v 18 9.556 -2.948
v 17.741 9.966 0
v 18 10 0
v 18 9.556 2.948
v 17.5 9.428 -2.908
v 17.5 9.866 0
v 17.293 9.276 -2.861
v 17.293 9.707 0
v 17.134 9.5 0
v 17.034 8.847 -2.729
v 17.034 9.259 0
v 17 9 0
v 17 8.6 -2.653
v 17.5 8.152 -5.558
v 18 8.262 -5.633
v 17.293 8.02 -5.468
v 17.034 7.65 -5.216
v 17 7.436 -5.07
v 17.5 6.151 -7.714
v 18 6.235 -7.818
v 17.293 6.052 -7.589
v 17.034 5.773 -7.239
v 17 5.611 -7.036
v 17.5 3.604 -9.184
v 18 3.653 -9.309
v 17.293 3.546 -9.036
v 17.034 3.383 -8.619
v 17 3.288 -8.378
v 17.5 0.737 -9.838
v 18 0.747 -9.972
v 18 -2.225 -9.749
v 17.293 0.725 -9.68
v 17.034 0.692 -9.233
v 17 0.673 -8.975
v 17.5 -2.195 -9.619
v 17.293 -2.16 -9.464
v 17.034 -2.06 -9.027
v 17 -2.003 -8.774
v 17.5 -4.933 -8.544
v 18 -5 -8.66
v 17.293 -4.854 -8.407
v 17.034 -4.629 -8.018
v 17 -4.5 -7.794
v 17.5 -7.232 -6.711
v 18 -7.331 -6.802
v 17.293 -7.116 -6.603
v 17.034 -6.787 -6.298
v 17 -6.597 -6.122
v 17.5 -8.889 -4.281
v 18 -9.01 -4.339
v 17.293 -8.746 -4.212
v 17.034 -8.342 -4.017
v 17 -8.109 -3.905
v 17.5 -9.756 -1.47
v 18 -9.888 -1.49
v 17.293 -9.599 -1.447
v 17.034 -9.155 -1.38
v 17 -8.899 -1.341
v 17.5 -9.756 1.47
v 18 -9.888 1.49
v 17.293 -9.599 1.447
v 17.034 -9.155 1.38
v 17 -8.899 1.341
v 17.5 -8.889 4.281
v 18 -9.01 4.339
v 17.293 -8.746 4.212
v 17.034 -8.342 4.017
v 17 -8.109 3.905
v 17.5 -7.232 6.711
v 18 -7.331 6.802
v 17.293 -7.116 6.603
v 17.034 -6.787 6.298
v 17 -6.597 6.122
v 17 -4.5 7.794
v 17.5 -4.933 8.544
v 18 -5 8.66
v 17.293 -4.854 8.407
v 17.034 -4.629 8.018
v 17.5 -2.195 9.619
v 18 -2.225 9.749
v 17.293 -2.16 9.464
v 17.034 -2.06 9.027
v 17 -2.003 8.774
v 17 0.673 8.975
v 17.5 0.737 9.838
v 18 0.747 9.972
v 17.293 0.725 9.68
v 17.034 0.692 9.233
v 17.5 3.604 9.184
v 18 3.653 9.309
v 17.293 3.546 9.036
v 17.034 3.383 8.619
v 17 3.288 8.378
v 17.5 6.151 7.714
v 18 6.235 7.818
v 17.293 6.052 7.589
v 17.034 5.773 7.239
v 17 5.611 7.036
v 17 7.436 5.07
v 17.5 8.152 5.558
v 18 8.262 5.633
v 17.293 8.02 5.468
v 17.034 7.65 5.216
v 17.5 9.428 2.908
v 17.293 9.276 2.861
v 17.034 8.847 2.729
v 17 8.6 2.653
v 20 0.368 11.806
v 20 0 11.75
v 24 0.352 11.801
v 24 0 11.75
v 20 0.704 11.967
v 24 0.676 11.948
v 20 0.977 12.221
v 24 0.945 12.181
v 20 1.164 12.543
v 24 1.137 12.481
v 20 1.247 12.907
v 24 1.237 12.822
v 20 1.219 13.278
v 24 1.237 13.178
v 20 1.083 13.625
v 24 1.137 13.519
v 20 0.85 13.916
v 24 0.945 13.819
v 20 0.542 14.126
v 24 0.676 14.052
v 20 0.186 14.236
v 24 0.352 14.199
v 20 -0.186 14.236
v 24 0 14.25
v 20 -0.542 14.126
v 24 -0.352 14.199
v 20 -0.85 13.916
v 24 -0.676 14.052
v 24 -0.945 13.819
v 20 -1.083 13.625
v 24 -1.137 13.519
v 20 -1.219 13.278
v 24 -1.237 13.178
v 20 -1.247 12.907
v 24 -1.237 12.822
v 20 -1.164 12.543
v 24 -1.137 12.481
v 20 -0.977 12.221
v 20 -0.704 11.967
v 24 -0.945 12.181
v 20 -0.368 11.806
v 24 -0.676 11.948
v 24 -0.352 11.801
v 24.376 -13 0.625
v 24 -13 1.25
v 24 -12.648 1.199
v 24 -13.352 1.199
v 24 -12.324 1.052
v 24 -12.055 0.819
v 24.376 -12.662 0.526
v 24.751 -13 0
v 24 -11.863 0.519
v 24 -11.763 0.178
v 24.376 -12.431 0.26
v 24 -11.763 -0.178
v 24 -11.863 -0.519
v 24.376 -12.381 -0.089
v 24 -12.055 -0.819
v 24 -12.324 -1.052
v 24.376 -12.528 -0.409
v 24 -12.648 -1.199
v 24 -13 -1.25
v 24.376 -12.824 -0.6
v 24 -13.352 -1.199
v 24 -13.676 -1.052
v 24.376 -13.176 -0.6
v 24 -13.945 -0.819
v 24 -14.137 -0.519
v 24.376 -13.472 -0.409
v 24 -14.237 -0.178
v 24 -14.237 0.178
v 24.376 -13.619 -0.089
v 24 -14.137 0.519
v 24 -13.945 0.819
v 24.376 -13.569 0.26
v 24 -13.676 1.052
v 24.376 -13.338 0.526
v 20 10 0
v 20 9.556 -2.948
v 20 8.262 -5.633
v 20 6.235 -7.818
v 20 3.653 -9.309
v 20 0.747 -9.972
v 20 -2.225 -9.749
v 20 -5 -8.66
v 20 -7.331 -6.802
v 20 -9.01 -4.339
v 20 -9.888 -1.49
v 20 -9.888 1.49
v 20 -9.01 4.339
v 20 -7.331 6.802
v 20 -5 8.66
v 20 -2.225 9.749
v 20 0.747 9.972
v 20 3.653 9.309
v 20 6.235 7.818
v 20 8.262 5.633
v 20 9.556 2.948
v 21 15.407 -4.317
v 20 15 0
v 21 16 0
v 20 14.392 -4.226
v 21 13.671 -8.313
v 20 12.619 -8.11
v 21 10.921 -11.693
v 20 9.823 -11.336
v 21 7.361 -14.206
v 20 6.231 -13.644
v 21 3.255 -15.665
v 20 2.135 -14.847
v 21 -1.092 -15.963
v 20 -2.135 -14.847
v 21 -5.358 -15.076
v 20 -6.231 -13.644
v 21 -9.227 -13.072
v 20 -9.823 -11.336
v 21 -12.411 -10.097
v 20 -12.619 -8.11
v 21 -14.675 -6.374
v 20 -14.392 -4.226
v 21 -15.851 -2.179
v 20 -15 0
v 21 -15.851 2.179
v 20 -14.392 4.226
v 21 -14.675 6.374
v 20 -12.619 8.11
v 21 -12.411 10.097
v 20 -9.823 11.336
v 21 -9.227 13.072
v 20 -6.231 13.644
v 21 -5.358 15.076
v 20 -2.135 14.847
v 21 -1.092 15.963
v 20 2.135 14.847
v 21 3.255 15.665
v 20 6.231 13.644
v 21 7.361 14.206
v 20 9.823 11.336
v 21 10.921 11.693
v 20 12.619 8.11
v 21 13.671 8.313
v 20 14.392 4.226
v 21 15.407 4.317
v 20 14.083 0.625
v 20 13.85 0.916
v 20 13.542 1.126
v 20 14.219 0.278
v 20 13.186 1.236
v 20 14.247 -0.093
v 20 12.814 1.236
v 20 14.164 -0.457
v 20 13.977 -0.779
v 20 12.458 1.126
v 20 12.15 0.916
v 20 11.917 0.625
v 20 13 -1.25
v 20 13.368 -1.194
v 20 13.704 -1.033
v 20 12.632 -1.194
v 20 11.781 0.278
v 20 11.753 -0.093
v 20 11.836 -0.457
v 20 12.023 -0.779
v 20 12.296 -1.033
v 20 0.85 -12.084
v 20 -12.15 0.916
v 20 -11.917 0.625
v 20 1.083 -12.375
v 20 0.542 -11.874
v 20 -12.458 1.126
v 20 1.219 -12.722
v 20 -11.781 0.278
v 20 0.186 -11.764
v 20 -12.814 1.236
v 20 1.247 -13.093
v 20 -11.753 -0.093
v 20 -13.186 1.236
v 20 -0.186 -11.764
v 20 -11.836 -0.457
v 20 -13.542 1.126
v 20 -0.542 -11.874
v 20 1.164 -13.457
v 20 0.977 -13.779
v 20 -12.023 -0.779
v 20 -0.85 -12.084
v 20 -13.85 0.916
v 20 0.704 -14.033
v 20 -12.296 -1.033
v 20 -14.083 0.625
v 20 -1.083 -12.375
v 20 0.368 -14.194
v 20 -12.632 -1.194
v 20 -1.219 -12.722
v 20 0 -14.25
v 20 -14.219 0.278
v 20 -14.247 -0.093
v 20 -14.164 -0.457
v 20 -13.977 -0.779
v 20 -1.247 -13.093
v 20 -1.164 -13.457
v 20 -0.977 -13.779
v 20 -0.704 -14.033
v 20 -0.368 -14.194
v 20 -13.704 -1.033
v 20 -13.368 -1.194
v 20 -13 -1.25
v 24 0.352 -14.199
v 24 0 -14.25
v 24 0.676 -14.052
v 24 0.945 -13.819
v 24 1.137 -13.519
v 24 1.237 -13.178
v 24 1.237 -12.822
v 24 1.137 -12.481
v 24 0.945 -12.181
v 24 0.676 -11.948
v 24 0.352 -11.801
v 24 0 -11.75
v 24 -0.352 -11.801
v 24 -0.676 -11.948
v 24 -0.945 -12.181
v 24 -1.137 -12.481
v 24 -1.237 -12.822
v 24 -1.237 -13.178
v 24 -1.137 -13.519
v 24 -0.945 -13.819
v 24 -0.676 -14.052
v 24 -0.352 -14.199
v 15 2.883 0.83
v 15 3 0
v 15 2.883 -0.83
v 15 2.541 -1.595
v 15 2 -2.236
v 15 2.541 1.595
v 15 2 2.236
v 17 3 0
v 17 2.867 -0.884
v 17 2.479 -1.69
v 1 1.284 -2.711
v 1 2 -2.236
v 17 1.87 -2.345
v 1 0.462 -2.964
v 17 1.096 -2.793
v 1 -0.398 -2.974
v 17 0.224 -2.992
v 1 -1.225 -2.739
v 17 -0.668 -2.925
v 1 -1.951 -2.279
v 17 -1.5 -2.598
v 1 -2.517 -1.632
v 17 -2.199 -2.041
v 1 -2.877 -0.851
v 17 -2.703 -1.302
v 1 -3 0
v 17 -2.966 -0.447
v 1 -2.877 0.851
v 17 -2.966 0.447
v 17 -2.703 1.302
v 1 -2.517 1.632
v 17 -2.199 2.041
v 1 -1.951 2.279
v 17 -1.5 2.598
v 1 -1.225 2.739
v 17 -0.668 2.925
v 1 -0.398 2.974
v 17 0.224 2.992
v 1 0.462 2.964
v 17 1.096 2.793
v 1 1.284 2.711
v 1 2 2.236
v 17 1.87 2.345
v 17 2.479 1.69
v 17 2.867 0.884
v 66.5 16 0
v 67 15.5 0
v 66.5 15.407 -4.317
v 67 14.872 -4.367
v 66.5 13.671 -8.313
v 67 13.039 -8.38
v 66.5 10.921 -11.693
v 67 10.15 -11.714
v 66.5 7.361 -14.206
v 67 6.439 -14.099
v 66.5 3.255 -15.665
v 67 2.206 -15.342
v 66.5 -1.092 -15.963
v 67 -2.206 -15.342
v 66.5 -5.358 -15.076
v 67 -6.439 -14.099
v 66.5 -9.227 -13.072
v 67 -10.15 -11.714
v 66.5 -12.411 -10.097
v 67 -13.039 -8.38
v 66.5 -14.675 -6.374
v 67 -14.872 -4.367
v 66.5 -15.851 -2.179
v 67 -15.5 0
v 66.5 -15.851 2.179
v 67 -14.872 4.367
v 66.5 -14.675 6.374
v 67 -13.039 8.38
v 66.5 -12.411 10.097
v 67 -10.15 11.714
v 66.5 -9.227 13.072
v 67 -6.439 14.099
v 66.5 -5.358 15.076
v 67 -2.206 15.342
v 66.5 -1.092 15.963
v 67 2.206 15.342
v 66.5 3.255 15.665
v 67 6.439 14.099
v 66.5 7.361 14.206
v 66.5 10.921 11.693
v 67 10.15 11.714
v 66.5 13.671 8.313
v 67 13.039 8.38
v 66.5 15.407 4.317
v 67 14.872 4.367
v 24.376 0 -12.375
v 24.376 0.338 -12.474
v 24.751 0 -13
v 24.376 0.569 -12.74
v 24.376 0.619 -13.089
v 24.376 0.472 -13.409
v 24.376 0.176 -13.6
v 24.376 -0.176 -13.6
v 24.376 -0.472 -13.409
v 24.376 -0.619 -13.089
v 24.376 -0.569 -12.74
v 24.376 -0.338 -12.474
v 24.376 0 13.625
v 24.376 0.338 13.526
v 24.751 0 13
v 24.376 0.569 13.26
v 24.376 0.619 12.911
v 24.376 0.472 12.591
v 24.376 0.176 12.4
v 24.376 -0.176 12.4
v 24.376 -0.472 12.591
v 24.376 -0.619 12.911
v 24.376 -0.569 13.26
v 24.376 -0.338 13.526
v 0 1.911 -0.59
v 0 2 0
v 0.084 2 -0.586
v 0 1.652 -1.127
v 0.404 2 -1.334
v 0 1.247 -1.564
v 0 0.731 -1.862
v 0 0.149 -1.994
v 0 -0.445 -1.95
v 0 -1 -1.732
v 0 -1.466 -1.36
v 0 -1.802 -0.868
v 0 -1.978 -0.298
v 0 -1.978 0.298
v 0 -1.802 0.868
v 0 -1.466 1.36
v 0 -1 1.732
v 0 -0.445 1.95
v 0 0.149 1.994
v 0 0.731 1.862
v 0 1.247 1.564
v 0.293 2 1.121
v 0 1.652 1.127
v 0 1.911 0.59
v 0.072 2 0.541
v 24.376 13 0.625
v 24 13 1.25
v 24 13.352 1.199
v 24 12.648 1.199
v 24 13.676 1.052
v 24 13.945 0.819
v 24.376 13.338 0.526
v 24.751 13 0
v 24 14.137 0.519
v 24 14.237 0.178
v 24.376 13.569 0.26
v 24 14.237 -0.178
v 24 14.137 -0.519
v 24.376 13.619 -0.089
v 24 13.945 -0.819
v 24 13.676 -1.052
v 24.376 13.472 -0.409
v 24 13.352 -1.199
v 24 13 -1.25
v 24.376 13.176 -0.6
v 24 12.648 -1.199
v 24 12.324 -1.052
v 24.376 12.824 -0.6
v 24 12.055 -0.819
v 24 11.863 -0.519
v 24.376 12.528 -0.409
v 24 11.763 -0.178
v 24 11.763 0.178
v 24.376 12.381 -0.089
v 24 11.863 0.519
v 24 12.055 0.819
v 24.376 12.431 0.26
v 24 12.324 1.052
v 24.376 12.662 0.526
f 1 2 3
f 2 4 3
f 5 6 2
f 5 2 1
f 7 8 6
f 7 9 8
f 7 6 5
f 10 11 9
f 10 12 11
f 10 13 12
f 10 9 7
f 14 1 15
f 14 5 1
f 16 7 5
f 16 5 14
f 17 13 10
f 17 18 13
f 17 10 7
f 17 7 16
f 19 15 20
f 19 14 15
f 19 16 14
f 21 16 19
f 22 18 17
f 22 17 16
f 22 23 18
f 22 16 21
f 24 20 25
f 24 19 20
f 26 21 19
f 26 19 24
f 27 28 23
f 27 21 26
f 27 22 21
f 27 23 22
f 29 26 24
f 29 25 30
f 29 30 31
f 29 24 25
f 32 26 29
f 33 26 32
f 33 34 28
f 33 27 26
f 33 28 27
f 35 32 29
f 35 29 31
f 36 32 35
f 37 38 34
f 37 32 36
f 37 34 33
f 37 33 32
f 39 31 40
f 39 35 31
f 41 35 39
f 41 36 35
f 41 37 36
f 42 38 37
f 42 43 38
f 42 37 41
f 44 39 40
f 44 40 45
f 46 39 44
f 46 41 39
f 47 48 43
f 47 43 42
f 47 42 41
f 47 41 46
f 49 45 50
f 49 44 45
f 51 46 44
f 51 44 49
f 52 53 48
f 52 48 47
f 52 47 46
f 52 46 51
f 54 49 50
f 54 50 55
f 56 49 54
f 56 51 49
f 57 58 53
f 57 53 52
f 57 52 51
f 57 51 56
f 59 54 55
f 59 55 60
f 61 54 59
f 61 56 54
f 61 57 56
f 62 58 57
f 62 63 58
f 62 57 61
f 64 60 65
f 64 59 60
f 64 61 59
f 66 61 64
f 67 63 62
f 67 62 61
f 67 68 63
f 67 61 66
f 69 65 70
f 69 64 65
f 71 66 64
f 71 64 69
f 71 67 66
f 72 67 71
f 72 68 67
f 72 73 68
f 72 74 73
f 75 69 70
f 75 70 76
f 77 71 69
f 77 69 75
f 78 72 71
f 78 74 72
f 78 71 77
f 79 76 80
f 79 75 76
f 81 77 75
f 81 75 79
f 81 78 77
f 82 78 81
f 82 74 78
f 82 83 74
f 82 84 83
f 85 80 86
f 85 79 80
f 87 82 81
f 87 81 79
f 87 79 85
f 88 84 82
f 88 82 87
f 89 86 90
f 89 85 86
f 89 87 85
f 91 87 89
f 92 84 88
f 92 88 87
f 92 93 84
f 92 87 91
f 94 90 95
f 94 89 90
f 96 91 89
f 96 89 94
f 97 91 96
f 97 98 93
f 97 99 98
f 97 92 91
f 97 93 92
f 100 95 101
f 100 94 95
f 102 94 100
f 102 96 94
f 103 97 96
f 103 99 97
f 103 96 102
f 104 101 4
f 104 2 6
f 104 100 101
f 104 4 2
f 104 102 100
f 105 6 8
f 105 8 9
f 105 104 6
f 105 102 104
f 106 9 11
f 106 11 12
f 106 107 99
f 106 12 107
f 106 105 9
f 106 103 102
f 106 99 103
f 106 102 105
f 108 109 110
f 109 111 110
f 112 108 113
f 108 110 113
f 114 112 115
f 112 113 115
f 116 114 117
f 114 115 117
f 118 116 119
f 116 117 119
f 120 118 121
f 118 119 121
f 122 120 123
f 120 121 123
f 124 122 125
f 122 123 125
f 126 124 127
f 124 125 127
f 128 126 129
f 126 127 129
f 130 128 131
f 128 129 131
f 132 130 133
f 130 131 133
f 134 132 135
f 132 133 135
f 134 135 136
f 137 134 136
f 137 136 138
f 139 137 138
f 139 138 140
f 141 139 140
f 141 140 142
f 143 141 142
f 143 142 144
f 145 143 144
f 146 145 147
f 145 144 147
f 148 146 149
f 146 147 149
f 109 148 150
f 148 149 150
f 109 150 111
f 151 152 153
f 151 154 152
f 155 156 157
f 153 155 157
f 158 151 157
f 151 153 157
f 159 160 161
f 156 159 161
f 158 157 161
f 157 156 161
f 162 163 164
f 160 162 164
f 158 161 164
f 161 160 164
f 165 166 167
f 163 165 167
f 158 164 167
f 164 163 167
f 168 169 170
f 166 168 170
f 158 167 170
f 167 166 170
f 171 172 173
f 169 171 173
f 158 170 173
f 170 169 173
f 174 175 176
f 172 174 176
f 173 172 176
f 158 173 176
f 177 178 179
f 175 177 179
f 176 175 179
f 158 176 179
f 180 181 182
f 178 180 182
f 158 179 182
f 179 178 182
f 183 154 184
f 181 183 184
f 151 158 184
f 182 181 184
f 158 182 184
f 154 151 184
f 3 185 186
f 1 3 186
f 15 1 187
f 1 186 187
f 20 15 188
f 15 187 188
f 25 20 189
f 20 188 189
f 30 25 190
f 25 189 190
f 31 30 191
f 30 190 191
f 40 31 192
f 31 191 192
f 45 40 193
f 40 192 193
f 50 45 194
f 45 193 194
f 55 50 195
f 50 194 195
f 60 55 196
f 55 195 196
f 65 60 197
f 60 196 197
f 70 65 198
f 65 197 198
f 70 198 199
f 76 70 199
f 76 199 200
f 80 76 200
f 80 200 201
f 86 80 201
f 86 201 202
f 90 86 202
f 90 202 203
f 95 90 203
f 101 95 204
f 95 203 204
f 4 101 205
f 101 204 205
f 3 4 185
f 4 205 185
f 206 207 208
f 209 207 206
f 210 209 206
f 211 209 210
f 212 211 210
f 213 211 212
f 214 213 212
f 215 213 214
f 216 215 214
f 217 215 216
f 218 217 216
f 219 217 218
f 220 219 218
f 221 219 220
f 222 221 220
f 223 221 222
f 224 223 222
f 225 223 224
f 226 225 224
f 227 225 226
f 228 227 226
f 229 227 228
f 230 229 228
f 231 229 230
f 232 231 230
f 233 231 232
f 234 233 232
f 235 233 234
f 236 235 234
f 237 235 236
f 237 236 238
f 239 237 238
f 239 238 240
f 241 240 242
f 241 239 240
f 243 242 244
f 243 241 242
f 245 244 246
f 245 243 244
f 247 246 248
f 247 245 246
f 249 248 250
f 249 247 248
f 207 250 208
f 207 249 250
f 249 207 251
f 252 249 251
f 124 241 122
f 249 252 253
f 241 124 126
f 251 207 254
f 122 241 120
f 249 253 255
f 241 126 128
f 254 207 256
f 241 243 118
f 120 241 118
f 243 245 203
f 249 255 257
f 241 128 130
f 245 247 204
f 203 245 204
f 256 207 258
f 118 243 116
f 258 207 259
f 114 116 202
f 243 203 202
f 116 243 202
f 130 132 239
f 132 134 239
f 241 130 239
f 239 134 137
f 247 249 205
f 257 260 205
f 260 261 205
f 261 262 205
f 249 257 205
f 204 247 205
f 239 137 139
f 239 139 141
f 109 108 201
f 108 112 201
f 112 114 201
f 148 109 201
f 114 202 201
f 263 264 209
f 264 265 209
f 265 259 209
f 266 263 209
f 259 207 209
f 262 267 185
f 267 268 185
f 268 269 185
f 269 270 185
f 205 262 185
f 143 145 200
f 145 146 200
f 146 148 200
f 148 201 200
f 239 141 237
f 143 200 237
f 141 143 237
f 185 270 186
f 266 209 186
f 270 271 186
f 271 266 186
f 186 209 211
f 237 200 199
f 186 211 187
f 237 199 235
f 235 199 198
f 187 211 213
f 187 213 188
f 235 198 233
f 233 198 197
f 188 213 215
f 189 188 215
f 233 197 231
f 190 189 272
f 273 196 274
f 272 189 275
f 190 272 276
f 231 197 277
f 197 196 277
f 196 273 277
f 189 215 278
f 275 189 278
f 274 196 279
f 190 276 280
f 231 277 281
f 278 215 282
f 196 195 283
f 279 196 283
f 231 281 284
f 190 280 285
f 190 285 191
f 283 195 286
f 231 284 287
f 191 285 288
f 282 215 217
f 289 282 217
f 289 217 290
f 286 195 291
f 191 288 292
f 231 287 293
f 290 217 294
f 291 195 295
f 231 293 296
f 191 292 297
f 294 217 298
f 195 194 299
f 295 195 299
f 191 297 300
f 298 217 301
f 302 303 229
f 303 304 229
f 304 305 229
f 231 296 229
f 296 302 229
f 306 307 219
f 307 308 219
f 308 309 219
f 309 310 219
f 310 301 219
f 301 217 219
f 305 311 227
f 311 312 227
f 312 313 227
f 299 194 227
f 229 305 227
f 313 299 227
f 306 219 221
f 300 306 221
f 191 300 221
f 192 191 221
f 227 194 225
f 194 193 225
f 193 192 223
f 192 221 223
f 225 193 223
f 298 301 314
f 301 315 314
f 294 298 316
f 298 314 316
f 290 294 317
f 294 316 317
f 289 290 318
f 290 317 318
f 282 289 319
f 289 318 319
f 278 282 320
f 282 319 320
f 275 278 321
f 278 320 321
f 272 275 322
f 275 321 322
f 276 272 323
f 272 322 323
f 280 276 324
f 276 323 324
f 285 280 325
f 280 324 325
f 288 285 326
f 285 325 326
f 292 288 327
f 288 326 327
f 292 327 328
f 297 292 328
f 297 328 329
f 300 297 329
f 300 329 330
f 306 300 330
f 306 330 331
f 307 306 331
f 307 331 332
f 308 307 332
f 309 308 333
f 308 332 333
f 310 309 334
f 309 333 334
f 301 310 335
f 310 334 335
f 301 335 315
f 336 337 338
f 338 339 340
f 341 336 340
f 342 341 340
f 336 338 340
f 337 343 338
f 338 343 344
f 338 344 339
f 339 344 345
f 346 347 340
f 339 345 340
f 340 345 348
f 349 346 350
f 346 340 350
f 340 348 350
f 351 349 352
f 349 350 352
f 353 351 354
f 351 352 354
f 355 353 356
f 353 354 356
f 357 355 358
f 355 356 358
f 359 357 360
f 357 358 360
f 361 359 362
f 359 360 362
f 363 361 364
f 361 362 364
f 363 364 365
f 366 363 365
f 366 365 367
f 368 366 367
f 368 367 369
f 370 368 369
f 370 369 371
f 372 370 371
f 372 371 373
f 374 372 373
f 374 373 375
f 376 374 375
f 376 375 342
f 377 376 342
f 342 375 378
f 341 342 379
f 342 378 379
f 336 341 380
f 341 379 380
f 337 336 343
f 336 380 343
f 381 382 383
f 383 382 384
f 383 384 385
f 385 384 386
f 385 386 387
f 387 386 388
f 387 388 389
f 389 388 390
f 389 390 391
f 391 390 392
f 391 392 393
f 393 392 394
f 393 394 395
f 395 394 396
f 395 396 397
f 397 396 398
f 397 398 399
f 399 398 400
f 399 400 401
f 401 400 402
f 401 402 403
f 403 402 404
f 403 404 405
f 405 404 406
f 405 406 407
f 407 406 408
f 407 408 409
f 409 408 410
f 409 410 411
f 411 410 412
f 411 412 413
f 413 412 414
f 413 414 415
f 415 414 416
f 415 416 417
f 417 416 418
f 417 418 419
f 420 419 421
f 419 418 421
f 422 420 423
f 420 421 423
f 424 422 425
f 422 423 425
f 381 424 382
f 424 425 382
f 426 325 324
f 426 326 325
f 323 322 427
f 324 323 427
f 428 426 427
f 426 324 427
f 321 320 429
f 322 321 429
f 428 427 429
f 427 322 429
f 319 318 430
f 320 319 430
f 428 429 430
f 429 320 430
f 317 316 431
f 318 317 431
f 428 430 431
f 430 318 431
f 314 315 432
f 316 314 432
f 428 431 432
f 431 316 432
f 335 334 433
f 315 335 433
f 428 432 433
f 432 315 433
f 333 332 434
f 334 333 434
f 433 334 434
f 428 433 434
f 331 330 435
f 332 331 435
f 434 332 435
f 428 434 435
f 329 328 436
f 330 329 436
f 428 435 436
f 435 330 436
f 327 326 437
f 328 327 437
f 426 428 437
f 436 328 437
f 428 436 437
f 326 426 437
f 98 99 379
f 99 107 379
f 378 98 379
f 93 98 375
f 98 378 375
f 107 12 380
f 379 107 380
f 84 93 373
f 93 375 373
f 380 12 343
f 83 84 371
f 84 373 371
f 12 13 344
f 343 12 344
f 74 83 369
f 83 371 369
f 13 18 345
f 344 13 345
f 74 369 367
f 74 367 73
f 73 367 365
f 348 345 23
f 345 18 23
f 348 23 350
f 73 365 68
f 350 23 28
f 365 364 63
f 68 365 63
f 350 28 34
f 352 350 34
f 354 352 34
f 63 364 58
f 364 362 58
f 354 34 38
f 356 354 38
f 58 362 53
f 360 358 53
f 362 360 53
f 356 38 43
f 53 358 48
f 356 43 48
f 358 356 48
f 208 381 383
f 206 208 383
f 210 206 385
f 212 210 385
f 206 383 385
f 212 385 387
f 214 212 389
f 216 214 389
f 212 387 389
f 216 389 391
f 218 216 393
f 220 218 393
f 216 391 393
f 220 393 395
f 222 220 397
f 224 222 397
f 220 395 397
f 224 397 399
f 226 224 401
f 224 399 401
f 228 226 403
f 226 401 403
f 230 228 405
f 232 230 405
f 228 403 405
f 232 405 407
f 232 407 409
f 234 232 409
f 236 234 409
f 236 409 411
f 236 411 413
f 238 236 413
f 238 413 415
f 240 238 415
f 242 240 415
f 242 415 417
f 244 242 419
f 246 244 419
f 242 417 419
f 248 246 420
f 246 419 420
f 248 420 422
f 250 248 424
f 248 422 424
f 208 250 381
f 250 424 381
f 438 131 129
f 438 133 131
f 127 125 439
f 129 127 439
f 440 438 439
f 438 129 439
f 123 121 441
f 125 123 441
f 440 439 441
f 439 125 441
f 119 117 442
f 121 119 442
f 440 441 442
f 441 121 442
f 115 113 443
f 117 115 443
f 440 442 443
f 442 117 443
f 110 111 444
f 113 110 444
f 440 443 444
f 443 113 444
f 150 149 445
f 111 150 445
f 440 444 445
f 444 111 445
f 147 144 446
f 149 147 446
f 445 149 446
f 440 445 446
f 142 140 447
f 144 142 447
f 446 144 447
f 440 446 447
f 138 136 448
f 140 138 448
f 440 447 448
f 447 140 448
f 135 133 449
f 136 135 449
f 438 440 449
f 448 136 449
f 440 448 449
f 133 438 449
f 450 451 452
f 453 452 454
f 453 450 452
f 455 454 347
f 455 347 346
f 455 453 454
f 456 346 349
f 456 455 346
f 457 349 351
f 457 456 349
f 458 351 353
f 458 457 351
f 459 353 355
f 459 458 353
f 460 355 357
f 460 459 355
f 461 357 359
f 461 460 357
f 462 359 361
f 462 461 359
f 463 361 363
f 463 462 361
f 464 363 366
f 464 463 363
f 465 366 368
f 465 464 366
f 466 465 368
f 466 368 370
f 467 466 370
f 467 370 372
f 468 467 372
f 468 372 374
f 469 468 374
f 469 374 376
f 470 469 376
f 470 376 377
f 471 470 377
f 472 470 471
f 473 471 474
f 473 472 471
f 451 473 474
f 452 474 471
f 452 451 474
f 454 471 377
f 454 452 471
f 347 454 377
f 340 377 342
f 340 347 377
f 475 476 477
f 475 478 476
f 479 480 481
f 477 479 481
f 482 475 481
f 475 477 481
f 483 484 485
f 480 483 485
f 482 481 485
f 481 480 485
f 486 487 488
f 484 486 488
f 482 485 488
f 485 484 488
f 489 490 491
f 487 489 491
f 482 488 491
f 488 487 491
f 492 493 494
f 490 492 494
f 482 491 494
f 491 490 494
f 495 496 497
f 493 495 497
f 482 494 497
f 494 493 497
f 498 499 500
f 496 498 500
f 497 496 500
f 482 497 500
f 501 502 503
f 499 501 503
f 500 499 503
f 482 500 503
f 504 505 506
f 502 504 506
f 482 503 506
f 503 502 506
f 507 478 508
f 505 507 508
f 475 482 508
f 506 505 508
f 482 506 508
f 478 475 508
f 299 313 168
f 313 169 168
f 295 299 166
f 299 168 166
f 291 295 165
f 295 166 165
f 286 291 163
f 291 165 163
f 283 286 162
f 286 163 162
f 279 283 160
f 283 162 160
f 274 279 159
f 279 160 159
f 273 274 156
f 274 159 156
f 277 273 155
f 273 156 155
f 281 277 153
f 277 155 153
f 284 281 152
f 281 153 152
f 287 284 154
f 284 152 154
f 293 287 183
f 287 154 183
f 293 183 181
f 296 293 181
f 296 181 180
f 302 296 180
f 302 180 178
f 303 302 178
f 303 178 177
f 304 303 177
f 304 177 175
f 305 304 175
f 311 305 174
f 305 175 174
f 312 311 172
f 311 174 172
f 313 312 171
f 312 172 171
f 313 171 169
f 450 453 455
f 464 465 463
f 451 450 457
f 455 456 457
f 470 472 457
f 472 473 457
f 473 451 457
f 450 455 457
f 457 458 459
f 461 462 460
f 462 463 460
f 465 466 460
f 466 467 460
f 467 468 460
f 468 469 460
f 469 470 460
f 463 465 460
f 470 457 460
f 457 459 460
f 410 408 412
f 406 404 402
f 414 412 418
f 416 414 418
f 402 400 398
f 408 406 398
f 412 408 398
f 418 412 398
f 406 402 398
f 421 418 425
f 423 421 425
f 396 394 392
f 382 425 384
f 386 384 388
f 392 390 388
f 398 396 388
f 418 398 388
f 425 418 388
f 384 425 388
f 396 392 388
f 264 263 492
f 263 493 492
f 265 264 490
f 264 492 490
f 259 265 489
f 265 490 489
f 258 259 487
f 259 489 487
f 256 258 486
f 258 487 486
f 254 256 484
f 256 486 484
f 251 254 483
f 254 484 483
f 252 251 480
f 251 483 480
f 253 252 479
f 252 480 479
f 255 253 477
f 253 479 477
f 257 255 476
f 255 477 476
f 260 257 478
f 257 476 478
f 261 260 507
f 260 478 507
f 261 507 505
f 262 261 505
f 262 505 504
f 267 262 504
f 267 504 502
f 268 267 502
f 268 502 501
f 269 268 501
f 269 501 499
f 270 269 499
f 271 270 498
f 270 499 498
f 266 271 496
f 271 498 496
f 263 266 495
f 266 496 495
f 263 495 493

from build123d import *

# Parameters (mm, degrees)
TROU_TARAUD_M3X0_51_D     = 2.5
TROU_TARAUD_M3X0_51_DEPTH = 4
TROU_TARAUD_M3X0_51_TIP   = 0.751075774
CHANFREIN1_SIZE           = 0.5
CHANFREIN2_SIZE           = 1
CONG_1_R                  = 1
CHANFREIN3_SIZE           = 1
ESQUISSE4_W               = 15
ESQUISSE4_H               = 6
ENL_V_MAT_EXTRU_1_DEPTH   = 1


with BuildPart() as part:
    # Esquisse1 → Révolution1 (revolve)
    with BuildSketch(Plane.XY):
        Polygon((0, 0), (0, 3), (17, 3), (17, 10), (20, 10), (20, 16), (67, 16), (67, 0), align=None)
    revolve(axis=Axis((67, 0, 0), (-1, 0, 0)))

    # Trou taraudé M3x0.51
    with Locations(Plane.ZY.offset(-20)):
        with Locations((-13, 0), (0, 13), (13, 0), (0, -13)):
            Hole(TROU_TARAUD_M3X0_51_D / 2, depth=TROU_TARAUD_M3X0_51_DEPTH)
            with Locations((0, 0, -(TROU_TARAUD_M3X0_51_DEPTH + TROU_TARAUD_M3X0_51_TIP / 2))):  # 118° drill point
                Cone(0, TROU_TARAUD_M3X0_51_D / 2, TROU_TARAUD_M3X0_51_TIP, mode=Mode.SUBTRACT)

    # Chanfrein1
    chanfrein1_edges = [part.edges().sort_by_distance(p)[0] for p in [
        (67, -16, 0),
    ]]
    chamfer(chanfrein1_edges, length=CHANFREIN1_SIZE)

    # Chanfrein2
    chanfrein2_edges = [part.edges().sort_by_distance(p)[0] for p in [
        (20, -16, 0),
    ]]
    chamfer(chanfrein2_edges, length=CHANFREIN2_SIZE)

    # Congé1
    cong_1_edges = [part.edges().sort_by_distance(p)[0] for p in [
        (17, -10, 0),
    ]]
    fillet(cong_1_edges, radius=CONG_1_R)

    # Chanfrein3
    chanfrein3_edges = [part.edges().sort_by_distance(p)[0] for p in [
        (0, -3, 0),
    ]]
    chamfer(chanfrein3_edges, length=CHANFREIN3_SIZE)

    # Esquisse4 → Enlèv. mat.-Extru.1 (cut)
    with BuildSketch(Plane(origin=(0, 3, 0), x_dir=(1, 0, 0), z_dir=(0, 1, 0))):
        with Locations((7.5, 0)):
            Rectangle(ESQUISSE4_W, ESQUISSE4_H)
    extrude(amount=-ENL_V_MAT_EXTRU_1_DEPTH, mode=Mode.SUBTRACT)


solid = part.part
